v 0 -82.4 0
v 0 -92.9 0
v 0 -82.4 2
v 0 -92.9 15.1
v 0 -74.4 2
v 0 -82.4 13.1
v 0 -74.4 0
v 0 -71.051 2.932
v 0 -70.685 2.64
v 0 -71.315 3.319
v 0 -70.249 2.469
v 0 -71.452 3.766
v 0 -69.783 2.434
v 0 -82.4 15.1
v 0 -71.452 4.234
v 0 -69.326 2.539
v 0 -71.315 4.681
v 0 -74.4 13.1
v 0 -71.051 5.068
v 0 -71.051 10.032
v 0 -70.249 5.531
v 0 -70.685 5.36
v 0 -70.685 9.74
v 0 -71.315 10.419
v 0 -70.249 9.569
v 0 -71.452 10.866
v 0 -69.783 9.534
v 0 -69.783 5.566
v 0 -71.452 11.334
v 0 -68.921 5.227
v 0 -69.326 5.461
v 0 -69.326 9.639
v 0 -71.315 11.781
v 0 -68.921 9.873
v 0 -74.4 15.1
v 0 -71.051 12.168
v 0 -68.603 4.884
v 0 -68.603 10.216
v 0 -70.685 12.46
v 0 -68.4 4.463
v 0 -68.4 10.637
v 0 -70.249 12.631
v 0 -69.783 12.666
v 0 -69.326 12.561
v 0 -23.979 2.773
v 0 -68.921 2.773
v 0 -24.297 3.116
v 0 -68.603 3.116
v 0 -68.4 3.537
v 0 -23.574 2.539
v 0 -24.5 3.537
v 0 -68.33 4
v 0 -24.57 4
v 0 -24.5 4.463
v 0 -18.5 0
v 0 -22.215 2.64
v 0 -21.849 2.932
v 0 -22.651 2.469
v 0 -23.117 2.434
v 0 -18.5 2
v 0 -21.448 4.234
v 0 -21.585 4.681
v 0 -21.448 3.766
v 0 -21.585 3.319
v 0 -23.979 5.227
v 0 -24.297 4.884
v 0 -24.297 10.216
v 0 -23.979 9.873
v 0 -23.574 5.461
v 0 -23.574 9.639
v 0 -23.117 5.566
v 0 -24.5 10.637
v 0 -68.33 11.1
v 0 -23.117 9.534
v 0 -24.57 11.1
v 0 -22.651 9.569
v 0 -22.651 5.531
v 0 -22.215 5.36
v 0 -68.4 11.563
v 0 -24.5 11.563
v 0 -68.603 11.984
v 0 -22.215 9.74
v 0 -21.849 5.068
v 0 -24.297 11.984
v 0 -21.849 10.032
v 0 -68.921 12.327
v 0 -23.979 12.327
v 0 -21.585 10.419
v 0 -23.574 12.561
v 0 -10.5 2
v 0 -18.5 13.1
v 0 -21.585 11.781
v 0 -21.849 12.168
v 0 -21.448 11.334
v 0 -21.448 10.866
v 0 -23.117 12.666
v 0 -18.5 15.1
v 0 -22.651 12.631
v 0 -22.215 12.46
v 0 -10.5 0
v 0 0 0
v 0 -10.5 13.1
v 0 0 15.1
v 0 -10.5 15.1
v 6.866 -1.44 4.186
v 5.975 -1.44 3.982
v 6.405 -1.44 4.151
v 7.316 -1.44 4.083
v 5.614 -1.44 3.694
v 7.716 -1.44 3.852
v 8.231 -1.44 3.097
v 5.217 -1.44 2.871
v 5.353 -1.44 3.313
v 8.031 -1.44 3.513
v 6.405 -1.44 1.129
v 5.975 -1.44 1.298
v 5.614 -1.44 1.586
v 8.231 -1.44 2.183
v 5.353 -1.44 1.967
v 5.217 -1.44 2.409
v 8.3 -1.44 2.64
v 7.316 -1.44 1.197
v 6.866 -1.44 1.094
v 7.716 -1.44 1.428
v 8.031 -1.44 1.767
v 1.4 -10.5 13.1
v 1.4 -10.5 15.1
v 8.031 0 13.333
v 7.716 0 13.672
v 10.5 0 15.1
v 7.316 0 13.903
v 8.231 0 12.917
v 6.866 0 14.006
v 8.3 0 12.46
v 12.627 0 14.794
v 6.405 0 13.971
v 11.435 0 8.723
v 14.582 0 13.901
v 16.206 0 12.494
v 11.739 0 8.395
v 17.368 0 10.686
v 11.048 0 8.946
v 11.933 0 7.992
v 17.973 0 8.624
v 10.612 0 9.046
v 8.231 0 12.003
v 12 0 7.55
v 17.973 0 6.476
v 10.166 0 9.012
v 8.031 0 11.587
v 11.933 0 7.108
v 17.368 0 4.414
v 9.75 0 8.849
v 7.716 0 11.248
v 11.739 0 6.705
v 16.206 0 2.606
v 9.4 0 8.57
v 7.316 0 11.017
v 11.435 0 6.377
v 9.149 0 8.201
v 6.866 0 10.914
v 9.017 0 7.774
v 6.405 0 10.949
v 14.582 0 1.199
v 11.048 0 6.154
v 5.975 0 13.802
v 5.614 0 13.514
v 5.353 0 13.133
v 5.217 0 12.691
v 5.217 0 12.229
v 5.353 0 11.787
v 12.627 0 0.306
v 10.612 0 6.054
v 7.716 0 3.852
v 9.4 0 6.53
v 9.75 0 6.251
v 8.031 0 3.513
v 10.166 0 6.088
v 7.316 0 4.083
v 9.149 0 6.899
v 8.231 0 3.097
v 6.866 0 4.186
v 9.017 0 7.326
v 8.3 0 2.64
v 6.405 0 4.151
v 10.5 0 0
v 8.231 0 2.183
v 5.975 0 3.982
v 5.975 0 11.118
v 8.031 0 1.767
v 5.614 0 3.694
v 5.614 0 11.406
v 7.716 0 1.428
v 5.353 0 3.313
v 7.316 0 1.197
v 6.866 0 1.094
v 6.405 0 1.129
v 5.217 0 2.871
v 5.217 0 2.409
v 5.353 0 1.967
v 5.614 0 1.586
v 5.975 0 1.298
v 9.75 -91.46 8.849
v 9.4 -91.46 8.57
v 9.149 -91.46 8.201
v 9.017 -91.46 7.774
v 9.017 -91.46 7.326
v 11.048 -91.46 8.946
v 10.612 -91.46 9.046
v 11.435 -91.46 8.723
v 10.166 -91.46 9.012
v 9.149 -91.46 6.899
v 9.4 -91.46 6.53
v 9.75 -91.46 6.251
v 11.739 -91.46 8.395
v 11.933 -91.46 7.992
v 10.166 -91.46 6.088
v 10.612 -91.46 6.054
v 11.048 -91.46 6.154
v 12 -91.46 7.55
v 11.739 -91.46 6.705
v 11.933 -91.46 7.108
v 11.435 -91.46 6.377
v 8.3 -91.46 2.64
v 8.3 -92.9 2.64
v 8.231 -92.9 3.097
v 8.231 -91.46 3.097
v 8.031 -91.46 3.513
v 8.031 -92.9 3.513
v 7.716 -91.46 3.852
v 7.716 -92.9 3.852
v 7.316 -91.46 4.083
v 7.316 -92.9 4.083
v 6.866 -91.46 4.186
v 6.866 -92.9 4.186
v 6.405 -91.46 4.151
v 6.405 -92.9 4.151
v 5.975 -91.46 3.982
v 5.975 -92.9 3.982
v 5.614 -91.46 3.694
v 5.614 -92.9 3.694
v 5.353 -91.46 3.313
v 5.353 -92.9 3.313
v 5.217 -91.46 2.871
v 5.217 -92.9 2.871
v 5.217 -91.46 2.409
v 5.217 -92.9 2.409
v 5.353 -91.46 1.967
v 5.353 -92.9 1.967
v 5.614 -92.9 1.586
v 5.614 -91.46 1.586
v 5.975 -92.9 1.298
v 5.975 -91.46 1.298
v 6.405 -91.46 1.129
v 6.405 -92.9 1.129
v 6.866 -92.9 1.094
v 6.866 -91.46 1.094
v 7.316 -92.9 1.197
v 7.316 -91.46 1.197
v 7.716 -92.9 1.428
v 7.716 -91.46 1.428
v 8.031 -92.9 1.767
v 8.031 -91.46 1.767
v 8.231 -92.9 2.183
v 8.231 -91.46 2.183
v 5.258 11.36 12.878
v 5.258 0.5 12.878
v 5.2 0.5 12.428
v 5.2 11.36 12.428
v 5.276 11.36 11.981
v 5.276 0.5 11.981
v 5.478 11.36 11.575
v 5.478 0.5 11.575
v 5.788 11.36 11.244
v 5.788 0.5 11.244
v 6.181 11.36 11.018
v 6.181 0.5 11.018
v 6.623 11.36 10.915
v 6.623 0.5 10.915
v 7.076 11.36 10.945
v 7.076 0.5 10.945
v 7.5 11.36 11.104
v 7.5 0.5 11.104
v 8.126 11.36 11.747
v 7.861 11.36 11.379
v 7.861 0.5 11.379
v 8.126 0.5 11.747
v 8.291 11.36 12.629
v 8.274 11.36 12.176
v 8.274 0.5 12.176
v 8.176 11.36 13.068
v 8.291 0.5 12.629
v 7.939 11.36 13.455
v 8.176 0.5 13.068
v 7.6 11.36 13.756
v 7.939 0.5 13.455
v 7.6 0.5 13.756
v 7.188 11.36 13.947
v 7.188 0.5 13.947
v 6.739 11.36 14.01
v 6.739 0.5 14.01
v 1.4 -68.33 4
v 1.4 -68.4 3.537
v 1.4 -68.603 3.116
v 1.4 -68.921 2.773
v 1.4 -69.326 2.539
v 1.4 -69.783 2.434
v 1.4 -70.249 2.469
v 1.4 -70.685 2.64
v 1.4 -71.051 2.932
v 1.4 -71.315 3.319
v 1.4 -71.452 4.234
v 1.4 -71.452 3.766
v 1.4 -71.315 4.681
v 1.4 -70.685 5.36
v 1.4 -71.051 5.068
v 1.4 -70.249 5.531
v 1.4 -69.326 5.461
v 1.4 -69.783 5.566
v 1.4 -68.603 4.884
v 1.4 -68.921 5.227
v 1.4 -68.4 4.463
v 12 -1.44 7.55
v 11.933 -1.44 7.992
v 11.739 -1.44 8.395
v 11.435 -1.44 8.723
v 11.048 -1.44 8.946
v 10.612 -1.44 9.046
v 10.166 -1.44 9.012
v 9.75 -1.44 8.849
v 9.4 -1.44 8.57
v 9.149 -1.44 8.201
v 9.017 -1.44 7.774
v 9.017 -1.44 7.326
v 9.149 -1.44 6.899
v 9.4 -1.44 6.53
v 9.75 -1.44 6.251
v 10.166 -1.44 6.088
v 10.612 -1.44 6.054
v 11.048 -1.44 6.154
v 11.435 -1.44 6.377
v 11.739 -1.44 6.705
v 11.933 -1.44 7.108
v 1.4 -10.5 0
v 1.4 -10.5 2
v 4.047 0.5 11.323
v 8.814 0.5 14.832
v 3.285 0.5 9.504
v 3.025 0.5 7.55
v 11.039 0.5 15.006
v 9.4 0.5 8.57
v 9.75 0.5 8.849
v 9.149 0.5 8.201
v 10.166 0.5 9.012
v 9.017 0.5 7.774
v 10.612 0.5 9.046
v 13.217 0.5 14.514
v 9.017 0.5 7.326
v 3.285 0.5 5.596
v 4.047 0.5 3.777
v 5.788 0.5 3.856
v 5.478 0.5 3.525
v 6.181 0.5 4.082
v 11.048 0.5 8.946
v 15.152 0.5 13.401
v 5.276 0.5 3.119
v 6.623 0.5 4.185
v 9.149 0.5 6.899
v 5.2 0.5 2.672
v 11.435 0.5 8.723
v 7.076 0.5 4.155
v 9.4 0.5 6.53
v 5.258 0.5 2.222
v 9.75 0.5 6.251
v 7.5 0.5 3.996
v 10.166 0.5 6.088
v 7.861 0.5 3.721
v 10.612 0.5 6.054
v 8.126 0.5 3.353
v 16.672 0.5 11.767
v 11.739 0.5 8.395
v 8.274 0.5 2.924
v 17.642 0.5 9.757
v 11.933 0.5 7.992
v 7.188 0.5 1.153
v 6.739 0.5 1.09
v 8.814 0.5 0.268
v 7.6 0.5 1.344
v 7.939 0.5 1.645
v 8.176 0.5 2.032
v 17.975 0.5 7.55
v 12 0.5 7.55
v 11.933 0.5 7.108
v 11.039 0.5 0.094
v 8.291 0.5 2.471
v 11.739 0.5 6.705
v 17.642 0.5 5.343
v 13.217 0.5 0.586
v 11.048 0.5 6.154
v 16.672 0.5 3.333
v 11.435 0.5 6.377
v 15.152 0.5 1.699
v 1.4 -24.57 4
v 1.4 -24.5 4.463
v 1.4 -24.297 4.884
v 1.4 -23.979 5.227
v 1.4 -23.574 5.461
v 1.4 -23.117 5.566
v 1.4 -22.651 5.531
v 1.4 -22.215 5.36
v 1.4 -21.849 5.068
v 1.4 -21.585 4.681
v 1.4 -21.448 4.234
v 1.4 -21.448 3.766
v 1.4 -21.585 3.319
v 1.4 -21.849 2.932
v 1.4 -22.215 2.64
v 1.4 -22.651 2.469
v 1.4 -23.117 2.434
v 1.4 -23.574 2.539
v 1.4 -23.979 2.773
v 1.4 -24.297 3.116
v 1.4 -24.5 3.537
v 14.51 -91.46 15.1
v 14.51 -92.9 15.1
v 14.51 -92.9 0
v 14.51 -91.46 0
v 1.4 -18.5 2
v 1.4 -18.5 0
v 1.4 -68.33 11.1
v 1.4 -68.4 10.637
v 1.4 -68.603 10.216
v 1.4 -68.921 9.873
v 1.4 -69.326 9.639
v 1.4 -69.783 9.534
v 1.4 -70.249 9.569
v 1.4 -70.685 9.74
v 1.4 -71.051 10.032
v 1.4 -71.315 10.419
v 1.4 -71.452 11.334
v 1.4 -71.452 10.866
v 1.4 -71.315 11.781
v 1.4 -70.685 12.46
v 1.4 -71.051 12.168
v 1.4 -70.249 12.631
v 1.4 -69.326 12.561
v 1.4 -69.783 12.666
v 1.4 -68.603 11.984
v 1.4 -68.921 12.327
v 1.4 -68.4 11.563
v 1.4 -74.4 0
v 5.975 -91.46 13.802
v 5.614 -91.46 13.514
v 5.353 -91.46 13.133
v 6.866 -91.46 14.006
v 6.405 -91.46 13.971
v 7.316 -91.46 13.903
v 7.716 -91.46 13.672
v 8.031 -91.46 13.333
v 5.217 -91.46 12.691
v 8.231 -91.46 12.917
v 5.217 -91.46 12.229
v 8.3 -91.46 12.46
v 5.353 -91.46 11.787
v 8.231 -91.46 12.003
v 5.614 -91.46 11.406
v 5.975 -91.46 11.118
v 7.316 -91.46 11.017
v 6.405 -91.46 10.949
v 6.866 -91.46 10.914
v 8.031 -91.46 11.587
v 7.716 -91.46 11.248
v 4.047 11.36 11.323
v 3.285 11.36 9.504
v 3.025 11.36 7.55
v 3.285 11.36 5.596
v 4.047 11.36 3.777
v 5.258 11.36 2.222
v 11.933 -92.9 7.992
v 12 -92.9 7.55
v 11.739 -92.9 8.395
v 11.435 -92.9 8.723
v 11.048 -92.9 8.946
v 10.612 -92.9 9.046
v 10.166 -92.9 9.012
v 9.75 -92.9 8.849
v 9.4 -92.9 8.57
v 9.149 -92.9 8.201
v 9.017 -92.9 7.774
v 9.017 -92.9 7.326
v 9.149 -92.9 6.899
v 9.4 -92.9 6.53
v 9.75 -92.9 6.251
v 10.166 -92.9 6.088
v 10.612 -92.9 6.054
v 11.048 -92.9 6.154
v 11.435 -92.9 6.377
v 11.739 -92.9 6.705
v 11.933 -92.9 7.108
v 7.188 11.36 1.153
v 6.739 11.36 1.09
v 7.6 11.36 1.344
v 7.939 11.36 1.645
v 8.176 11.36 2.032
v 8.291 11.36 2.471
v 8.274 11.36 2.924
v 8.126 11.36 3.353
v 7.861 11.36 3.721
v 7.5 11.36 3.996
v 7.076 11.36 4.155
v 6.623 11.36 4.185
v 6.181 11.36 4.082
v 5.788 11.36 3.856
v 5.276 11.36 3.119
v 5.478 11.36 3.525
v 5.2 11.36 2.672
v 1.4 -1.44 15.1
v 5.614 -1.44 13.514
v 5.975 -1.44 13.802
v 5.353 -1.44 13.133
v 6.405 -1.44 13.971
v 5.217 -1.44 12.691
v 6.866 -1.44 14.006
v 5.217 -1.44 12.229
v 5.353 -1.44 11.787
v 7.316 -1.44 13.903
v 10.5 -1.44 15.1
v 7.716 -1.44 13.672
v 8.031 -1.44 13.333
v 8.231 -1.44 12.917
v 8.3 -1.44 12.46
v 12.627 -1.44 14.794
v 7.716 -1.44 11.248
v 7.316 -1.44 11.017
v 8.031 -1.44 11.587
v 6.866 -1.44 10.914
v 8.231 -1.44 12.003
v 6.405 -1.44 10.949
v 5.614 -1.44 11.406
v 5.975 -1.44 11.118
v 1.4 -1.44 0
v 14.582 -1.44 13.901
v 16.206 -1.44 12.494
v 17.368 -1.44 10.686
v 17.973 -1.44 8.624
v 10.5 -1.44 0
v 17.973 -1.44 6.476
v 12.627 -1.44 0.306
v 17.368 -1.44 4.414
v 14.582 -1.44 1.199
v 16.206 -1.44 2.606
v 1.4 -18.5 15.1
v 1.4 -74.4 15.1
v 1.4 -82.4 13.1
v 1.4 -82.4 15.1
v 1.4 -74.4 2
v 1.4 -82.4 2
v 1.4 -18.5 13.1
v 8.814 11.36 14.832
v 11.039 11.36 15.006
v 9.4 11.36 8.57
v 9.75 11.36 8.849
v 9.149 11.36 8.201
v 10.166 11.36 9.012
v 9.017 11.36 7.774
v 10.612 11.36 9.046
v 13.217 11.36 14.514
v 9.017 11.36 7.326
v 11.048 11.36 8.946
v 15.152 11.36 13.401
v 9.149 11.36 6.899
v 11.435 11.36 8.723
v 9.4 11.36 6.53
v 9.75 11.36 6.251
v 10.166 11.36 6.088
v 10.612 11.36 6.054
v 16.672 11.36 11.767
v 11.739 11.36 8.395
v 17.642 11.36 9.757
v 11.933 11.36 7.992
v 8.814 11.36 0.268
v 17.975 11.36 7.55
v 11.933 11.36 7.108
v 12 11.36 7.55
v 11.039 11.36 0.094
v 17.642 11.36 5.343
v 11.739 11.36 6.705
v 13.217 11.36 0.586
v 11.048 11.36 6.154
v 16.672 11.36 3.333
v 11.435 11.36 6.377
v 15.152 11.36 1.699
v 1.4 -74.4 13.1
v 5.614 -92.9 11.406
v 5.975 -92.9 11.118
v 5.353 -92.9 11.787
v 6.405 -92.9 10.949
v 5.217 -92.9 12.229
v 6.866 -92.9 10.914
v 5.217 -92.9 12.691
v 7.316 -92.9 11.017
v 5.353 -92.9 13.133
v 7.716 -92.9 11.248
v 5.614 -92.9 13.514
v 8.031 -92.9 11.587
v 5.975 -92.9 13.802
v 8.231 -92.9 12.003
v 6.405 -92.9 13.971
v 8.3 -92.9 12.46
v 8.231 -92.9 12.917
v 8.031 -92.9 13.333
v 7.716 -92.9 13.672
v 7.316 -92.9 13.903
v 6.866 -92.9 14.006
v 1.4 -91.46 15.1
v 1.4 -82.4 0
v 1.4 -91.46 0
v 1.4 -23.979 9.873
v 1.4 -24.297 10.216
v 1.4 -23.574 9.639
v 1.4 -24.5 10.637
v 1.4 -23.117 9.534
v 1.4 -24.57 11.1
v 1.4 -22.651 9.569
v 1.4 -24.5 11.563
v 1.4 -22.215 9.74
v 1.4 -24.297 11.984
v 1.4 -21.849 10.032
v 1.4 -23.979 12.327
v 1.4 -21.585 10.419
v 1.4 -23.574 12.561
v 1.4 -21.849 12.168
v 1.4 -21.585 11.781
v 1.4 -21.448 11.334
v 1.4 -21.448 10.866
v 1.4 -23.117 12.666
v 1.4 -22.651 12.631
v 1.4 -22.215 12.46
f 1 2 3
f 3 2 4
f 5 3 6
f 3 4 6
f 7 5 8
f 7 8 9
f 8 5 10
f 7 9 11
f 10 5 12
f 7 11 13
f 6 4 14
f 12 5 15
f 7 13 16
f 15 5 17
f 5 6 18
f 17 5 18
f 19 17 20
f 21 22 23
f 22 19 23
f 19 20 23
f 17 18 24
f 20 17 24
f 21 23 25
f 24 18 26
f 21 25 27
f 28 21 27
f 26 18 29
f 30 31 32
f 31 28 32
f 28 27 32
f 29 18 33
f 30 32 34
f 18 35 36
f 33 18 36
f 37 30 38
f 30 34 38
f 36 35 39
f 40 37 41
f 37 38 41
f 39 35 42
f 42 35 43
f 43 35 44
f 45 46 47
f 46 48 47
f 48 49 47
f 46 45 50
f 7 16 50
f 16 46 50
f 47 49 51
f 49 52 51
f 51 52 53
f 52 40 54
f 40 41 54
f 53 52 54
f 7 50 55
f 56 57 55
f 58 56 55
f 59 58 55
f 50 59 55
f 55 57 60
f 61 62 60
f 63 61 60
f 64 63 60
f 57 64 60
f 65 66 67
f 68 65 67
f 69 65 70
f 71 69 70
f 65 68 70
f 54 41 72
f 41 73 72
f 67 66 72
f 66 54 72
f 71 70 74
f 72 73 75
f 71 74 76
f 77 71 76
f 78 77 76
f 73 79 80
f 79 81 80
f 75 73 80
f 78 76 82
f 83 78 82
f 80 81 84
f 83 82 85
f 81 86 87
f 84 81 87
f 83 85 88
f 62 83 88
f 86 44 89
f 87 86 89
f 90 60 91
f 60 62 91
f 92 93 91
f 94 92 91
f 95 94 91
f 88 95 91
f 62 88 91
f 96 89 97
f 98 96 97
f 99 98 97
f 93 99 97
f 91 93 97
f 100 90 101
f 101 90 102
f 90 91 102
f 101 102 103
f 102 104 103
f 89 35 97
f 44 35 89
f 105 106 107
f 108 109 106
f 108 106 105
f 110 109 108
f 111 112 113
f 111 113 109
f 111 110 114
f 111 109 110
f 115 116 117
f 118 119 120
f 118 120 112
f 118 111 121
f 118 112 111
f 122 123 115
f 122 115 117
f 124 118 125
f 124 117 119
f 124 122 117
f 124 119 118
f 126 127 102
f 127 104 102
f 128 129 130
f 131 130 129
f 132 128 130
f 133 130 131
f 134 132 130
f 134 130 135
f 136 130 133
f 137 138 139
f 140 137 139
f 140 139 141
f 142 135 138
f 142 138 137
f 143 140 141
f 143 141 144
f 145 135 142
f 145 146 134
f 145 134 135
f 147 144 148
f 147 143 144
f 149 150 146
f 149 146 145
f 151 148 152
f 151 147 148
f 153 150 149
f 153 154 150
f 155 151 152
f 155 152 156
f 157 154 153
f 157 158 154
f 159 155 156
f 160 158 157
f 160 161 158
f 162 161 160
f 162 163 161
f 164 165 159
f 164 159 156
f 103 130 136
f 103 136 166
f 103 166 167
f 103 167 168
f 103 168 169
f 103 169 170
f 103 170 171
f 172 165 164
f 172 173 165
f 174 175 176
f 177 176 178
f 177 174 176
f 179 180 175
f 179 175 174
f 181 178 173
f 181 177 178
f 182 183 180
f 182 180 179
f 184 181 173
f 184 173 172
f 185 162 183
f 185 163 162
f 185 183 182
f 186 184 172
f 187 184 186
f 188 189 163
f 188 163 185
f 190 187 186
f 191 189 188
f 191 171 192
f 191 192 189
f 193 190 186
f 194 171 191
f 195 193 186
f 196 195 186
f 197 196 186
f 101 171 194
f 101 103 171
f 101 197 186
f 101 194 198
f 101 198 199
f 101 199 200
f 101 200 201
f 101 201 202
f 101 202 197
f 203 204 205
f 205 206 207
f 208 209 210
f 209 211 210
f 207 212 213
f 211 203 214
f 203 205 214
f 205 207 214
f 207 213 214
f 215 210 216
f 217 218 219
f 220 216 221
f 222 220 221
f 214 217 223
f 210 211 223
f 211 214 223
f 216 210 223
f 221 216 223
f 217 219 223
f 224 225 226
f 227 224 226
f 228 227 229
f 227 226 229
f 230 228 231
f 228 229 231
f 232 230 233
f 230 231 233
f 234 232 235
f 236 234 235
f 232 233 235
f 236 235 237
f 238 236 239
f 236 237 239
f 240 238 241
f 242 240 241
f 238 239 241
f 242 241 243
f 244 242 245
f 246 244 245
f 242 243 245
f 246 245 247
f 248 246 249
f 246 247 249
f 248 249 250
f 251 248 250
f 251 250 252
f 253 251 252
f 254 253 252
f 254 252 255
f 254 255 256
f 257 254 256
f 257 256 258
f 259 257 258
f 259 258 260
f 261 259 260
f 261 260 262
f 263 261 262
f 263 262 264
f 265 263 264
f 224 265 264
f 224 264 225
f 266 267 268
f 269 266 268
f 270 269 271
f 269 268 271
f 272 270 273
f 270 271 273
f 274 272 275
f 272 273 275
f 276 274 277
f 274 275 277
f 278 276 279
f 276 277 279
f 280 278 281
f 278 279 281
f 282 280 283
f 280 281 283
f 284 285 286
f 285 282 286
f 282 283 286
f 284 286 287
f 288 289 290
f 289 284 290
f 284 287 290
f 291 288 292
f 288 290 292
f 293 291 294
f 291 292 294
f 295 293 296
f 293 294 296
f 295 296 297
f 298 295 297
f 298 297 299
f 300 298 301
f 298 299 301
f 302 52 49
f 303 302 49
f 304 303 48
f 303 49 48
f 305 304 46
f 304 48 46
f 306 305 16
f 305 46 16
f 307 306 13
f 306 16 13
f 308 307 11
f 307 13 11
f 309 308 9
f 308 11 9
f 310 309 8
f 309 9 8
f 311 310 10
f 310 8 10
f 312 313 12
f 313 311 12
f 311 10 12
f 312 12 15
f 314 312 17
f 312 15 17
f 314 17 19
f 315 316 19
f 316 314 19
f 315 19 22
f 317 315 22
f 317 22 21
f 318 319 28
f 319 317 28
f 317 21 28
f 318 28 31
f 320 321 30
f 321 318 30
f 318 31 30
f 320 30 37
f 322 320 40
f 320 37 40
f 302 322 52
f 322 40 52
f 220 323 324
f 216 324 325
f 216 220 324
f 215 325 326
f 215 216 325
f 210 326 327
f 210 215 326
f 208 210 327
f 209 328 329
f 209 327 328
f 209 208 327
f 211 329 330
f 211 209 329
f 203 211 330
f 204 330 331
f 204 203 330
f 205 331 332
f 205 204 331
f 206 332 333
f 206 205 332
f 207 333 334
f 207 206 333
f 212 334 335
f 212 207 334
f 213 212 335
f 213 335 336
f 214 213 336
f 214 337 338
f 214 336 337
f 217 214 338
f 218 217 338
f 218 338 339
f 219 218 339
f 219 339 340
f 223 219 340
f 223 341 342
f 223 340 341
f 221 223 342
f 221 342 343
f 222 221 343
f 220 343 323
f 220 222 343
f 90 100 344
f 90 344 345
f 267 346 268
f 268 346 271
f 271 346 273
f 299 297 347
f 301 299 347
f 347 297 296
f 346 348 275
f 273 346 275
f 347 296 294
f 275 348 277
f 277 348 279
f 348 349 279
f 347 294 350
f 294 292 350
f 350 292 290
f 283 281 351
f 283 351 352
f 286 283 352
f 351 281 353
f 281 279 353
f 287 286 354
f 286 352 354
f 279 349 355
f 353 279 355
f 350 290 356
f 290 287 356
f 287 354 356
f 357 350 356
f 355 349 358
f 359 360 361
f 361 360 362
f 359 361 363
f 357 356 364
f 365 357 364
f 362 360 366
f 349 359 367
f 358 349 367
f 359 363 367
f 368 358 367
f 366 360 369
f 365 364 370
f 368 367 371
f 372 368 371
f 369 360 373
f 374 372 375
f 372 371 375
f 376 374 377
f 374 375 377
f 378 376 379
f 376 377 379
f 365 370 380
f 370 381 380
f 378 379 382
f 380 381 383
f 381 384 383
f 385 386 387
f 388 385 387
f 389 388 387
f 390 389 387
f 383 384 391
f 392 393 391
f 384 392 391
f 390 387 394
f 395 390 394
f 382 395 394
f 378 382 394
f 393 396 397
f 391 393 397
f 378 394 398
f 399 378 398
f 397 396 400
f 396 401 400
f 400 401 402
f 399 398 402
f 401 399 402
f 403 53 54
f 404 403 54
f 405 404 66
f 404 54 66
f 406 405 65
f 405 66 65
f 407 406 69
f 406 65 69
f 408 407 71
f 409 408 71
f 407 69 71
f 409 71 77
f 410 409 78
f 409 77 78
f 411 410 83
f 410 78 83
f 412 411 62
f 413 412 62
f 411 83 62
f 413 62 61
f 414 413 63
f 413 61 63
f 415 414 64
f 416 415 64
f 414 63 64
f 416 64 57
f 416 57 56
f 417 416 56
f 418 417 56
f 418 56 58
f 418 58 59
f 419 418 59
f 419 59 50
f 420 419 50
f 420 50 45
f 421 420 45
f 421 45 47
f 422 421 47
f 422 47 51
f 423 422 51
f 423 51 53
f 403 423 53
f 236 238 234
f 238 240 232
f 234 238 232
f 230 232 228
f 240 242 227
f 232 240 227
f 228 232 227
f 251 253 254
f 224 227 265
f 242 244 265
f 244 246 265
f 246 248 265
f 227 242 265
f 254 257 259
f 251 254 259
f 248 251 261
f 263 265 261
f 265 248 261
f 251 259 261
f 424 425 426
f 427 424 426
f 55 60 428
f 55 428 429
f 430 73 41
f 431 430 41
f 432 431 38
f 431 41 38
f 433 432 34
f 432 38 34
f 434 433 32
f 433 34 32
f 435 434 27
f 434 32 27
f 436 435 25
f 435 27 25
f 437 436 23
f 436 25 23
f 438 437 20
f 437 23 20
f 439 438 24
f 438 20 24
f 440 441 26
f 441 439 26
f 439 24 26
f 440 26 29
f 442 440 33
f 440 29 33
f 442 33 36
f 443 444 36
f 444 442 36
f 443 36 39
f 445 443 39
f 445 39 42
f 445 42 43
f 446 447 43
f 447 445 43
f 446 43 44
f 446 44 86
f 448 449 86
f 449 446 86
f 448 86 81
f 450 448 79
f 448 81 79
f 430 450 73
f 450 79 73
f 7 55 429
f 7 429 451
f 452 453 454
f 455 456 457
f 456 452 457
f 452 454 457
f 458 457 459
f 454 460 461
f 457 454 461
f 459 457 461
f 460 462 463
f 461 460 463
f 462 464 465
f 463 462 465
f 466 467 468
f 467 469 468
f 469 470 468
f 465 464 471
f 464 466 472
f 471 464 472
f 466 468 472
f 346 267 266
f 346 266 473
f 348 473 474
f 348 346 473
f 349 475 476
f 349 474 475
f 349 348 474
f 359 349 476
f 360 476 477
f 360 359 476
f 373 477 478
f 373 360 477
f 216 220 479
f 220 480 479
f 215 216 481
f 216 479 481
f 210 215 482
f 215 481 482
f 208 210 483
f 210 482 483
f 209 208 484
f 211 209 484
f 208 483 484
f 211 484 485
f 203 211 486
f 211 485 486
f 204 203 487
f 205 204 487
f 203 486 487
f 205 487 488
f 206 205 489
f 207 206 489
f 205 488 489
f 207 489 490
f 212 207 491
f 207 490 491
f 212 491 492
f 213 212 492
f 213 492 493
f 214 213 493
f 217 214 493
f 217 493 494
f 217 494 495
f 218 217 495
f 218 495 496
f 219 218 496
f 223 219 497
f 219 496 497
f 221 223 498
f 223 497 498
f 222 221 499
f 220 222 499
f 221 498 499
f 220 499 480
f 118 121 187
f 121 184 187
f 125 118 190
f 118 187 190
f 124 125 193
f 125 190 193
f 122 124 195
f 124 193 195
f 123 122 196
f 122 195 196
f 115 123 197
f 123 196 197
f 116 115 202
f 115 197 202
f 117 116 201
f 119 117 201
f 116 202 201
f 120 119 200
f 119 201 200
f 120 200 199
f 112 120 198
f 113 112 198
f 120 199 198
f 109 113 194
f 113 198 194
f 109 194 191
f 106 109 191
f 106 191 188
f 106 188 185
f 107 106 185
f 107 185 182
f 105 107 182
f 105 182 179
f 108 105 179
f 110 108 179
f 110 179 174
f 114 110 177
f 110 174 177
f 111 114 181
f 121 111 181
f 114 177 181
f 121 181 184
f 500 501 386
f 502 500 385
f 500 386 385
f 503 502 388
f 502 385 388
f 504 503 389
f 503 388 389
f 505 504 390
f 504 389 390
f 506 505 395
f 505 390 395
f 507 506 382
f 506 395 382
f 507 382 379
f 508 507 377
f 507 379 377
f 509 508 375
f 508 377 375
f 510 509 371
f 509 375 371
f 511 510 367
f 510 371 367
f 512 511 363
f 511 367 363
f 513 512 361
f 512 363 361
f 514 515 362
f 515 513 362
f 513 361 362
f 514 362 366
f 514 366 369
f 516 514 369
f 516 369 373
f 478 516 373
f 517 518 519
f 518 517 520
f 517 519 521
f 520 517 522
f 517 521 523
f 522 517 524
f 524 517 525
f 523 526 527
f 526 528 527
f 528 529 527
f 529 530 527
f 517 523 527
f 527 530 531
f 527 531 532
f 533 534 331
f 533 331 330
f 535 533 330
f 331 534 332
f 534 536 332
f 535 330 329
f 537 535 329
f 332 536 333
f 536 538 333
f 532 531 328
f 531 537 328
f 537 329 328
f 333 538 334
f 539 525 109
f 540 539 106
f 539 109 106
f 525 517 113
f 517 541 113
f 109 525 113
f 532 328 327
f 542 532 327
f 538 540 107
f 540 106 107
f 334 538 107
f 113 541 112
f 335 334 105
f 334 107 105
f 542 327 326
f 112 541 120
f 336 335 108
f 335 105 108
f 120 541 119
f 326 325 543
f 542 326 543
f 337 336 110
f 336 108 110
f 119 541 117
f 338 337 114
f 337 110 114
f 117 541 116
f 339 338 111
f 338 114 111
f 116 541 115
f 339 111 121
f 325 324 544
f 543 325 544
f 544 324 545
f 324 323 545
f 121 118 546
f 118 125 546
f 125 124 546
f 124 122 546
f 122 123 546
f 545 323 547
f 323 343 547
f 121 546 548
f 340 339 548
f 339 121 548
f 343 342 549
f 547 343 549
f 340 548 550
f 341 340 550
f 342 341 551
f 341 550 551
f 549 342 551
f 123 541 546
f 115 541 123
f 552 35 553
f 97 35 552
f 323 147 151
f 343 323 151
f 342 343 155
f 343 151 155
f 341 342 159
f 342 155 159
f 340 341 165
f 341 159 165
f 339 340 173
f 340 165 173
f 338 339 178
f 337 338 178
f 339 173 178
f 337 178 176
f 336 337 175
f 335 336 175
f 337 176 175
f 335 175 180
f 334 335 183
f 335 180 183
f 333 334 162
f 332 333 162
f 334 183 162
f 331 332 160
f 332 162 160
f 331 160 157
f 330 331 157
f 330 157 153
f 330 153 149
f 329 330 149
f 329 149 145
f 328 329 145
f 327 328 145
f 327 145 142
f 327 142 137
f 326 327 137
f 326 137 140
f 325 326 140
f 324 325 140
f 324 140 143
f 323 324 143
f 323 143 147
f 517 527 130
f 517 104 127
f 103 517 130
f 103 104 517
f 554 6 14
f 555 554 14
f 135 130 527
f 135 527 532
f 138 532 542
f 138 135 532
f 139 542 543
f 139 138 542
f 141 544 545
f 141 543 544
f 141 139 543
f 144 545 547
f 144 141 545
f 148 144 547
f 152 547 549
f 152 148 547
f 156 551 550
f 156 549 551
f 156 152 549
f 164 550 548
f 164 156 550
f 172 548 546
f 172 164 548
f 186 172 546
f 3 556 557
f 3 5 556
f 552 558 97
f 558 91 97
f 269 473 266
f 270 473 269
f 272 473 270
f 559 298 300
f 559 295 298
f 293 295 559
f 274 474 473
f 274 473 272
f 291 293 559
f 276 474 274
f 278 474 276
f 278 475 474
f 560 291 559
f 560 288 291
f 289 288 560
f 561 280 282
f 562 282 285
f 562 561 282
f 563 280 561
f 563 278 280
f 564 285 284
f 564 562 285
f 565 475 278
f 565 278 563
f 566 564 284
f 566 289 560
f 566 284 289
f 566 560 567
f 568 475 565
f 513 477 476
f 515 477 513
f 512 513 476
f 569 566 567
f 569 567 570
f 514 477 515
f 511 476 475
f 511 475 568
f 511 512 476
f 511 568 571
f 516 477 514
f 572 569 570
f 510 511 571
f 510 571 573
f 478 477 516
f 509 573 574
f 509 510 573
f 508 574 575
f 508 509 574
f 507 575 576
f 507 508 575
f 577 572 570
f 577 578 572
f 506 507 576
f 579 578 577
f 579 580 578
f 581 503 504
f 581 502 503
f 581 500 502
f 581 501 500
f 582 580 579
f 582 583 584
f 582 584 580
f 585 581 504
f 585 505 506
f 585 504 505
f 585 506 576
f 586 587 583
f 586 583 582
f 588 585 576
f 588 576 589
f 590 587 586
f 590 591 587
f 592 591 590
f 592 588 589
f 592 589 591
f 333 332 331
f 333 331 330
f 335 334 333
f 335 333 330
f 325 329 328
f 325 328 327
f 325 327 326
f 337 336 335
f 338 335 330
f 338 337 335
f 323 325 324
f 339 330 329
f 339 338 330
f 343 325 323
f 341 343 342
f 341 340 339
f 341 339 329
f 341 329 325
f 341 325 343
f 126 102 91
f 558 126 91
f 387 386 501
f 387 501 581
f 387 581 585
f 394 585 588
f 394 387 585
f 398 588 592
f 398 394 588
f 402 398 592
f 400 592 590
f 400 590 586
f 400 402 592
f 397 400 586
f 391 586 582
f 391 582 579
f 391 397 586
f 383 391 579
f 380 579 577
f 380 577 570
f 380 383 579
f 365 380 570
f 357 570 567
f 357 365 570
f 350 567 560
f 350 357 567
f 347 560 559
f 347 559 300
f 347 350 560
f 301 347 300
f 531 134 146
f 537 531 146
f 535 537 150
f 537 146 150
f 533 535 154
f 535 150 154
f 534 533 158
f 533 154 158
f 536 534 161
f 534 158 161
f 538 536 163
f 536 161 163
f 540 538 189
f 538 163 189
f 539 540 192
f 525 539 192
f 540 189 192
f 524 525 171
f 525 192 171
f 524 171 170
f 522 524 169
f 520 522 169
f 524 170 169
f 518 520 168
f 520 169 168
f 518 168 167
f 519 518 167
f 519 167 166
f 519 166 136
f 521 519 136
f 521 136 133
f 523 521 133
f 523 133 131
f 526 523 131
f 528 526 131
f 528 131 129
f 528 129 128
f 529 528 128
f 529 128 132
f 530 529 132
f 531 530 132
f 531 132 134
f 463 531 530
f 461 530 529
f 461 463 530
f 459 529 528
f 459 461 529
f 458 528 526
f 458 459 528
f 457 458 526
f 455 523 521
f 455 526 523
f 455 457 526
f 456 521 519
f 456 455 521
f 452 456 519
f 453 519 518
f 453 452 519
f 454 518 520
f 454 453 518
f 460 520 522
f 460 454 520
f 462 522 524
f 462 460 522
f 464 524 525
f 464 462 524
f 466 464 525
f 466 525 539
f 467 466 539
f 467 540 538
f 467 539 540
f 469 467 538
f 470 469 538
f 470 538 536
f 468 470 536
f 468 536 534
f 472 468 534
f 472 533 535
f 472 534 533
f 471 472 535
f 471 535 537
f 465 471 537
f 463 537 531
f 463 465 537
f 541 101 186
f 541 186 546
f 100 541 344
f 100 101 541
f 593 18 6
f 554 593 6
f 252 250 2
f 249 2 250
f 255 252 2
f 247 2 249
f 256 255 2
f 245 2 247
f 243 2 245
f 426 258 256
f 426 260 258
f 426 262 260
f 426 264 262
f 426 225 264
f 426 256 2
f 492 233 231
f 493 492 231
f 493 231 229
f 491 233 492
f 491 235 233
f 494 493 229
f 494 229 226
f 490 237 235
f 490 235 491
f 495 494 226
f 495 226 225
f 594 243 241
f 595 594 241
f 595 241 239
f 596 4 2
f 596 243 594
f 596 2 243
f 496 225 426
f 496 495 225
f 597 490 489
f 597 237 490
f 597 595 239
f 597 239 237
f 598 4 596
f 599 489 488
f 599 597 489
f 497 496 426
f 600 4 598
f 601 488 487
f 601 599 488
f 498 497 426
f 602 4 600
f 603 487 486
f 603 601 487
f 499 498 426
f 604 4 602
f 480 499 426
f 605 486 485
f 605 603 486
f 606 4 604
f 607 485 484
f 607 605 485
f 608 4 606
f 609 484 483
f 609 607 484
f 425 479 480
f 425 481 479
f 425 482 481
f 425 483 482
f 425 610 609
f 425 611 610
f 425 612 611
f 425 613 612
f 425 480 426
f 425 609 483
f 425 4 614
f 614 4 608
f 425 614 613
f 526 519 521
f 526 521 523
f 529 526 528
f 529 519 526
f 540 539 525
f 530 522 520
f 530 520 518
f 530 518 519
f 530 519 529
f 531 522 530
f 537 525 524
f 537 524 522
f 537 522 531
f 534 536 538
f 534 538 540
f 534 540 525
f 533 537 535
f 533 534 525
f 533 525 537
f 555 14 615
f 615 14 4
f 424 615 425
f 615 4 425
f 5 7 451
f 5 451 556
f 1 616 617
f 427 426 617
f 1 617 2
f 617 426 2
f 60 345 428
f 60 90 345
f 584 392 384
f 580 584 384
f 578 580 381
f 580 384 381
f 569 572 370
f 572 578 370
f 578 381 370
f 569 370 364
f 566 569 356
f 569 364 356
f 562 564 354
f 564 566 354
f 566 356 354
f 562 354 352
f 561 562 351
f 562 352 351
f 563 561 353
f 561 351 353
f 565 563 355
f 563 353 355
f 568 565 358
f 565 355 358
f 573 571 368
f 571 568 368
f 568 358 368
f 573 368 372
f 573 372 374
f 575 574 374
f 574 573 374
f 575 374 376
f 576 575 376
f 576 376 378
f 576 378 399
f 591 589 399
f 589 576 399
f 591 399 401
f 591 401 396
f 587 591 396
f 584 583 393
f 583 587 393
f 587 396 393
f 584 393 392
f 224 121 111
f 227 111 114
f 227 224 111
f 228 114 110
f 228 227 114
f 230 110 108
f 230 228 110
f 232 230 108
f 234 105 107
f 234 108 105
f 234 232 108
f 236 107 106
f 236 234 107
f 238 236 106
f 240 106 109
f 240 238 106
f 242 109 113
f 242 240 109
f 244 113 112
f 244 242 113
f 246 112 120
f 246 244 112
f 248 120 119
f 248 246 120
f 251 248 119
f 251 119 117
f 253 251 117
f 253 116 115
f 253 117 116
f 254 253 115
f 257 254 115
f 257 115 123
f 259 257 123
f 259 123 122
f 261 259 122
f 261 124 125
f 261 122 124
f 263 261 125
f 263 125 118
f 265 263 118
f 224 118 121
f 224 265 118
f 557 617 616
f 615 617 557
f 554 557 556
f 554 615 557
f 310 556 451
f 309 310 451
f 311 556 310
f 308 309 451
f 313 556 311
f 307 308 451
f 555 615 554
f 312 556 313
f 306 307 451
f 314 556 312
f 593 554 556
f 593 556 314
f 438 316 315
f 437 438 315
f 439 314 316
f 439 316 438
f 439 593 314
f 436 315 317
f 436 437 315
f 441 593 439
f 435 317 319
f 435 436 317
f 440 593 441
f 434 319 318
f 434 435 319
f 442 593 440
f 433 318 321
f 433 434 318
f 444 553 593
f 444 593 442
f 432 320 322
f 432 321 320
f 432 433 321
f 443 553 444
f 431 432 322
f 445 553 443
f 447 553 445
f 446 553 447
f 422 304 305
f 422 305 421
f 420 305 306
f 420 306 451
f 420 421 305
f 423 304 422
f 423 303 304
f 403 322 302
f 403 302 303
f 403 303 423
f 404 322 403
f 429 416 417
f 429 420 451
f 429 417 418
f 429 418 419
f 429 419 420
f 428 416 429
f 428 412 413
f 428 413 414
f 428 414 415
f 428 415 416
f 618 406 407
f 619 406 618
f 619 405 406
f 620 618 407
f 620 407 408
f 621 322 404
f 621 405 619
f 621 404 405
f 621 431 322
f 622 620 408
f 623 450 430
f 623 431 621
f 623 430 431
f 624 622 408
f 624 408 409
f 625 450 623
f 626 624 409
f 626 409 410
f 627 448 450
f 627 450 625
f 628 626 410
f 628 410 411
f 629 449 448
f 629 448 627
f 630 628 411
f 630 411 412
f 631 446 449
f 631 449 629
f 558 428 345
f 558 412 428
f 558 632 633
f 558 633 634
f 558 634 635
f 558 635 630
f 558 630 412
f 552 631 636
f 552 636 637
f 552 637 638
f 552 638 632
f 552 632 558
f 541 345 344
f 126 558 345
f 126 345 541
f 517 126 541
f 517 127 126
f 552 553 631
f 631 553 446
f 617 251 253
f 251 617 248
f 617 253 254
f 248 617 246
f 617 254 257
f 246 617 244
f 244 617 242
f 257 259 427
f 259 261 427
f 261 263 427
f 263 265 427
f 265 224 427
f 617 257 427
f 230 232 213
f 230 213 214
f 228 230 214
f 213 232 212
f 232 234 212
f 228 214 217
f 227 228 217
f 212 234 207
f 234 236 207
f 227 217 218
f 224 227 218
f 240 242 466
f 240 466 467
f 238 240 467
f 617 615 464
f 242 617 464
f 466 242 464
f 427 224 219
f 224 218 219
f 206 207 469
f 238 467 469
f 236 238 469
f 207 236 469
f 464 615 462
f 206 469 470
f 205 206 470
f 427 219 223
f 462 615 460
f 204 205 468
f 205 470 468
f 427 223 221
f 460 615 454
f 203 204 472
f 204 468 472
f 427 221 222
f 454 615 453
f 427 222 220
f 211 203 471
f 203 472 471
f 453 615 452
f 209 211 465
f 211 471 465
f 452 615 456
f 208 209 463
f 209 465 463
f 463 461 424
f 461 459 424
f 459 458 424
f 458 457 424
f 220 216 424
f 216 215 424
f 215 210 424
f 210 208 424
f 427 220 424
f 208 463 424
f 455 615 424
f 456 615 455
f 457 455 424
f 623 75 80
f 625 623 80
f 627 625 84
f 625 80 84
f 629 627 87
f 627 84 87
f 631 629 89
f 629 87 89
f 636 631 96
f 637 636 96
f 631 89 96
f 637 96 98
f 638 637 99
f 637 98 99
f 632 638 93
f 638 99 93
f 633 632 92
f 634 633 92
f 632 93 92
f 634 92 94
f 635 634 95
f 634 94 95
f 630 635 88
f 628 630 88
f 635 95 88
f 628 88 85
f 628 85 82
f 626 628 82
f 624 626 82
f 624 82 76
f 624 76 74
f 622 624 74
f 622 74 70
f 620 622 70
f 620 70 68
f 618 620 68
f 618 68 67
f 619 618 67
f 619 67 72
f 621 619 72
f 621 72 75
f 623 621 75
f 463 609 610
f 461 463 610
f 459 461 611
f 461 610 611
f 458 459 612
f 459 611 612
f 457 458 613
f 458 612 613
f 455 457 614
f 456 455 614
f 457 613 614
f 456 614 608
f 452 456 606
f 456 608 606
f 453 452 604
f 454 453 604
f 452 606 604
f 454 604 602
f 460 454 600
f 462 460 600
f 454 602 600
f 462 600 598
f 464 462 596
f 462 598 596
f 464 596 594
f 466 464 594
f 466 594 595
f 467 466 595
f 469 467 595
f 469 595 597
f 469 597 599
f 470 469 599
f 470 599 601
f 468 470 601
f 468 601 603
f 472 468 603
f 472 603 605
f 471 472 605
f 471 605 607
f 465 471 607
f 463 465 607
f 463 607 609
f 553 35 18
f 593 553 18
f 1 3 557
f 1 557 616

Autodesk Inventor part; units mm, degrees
ref_plane "YZ Plane" through (0, 0, 0) normal (1, 0, 0) x (0, 1, 0)
ref_plane "XZ Plane" through (0, 0, 0) normal (0, 1, 0) x (-1, 0, 0)
ref_plane "XY Plane" through (0, 0, 0) normal (0, 0, 1) x (1, 0, 0)
sketch "Skizze1" plane through (0, 0, 0) normal (1, 0, 0) x (0, 1, 0)
  line L0 (0, 0) -> (-92.9, 0)
  line L1 (-92.9, 0) -> (-92.9, 15.1)
  line L2 (-92.9, 15.1) -> (0, 15.1)
  line L3 (0, 15.1) -> (0, 0)
  line L4 (-46.45, 15.1) -> (-46.45, 0)
  circle A0 centre (-69.9, 11.1) radius 1.57
  circle A1 centre (-69.9, 4) radius 1.57
  line L5 (-82.4, 15.1) -> (-74.4, 15.1)
  line L6 (-74.4, 15.1) -> (-74.4, 13.1)
  line L7 (-74.4, 13.1) -> (-82.4, 13.1)
  line L8 (-82.4, 13.1) -> (-82.4, 15.1)
  line L9 (-82.4, 0) -> (-74.4, 0)
  line L10 (-74.4, 0) -> (-74.4, 2)
  line L11 (-74.4, 2) -> (-82.4, 2)
  line L12 (-82.4, 2) -> (-82.4, 0)
  dimension "d0" = 92.9
  dimension "d1" = 15.1
  dimension "d2" = 3.14
  dimension "d3" = 3.14
  dimension "d4" = 23
  dimension "d5" = 23
  dimension "d6" = 4
  dimension "d7" = 4
  dimension "d8" = 8
  dimension "d9" = 2
  dimension "d10" = 10.5
  dimension "d11" = 2
extrude "Extrusion1" add sketch "Skizze1" along normal blind 1.4 contours L0 L10 L11 L12 L1 L2 L8 L7 L6 L4
mirror "Spiegeln1" about plane through (0, -46.45, 0) normal (0, 1, 0) of "Extrusion1"
sketch "Skizze2" plane through (0, -92.9, 0) normal (0, -1, 0) x (1, 0, 0)
  line L0 (0, 15.1) -> (0, 0) projected
  line L1 (0, 0) -> (1.4, 0) projected
  line L2 (1.4, 15.1) -> (1.4, 0) projected
  line L3 (0, 15.1) -> (1.4, 15.1) projected
  circle A0 centre (10.5, 7.55) radius 1.5
  circle A1 centre (6.75, 12.46) radius 1.55
  circle A2 centre (6.75, 2.64) radius 1.55
  line L4 (1.4, 15.1) -> (1.4, 13.1) projected
  line L5 (1.4, 15.1) -> (14.51, 15.1)
  line L6 (14.51, 15.1) -> (14.51, 0)
  line L7 (14.51, 0) -> (1.4, 0)
  line L8 (1.4, 0) -> (1.4, 15.1)
  dimension "d14" = 3
  dimension "d15" = 10.5
  dimension "d16" = 3.1
  dimension "d17" = 3.1
  dimension "d18" = 6.75
  dimension "d19" = 6.75
  dimension "d20" = 2.64
  dimension "d21" = 2.64
  dimension "d22" = 13.11
extrude "Extrusion2" add sketch "Skizze2" against normal blind 1.44 contours L5 L6 L7 L2
sketch "Skizze3" plane through (0, 0, 15.1) normal (0, 1, 0) x (1, 0, 0)
  line L0 (0, 0) -> (0, 15.1) projected
  line L1 (0, 0) -> (1.4, 0) projected
  line L2 (1.4, 0) -> (1.4, 15.1) projected
  line L3 (0, 15.1) -> (1.4, 15.1) projected
  line L4 (14.51, 0) -> (14.51, 15.1) projected
  line L5 (14.51, 15.1) -> (1.4, 15.1) projected
  line L6 (1.4, 0) -> (1.4, 15.1) projected
  line L7 (1.4, 0) -> (14.51, 0) projected
  circle A0 centre (10.5, 7.55) radius 1.5 projected
  circle A1 centre (6.75, 2.64) radius 1.55 projected
  circle A2 centre (6.75, 12.46) radius 1.55 projected
  circle A3 centre (10.5, 7.55) radius 7.55
  point P0 (10.5, 15.1)
  point P1 (10.5, 0)
extrude "Extrusion3" add sketch "Skizze3" against normal blind 1.44 contours L2 L5 A3 A2 A1 L7 | A3 A1 A2 L4 | L4 A3
ref_plane "Arbeitsebene1" through (0, 0.5, 15.1) normal (0, 1, 0) x (1, 0, 0)
sketch "Skizze4" plane through (0, 0.5, 15.1) normal (0, 1, 0) x (1, 0, 0)
  circle A0 centre (10.5, 7.55) radius 1.5 projected
  circle A1 centre (6.75, 2.64) radius 1.55 projected
  circle A2 centre (6.75, 12.46) radius 1.55 projected
  line L0 (0, 0) -> (0, 15.1) projected
  line L1 (0, 0) -> (10.5, 0) projected
  arc A3 (10.5, 0) -> (10.5, 15.1) centre (10.5, 7.55) ccw projected
  line L2 (0, 15.1) -> (10.5, 15.1) projected
  circle A4 centre (10.5, 7.55) radius 1.5 projected
  circle A5 centre (10.5, 7.55) radius 7.475
  dimension "d28" = 14.95
extrude "Extrusion4" add sketch "Skizze4" along normal blind 10.86 contours A1 A5 A2
sketch "Skizze5" plane through (0, -91.46, 0) normal (0, 1, 0) x (1, 0, 0)
  line L0 (14.51, -15.1) -> (14.51, 0) projected
  line L1 (14.51, 0) -> (1.4, 0) projected
  line L2 (1.4, -15.1) -> (1.4, 0) projected
  line L3 (1.4, -15.1) -> (14.51, -15.1) projected
  circle A0 centre (10.5, -7.55) radius 1.5 projected
  circle A1 centre (6.75, -12.46) radius 1.55 projected
  circle A2 centre (6.75, -2.64) radius 1.55 projected
  point P0 (0, 0)
extrude "Extrusion5" add sketch "Skizze5" along normal up to surface (90.02 mm away) contours A0 | A1 | A2
equation "\"d16\" = d17"
properties part number "00_Linear_Stepper_90mm"
